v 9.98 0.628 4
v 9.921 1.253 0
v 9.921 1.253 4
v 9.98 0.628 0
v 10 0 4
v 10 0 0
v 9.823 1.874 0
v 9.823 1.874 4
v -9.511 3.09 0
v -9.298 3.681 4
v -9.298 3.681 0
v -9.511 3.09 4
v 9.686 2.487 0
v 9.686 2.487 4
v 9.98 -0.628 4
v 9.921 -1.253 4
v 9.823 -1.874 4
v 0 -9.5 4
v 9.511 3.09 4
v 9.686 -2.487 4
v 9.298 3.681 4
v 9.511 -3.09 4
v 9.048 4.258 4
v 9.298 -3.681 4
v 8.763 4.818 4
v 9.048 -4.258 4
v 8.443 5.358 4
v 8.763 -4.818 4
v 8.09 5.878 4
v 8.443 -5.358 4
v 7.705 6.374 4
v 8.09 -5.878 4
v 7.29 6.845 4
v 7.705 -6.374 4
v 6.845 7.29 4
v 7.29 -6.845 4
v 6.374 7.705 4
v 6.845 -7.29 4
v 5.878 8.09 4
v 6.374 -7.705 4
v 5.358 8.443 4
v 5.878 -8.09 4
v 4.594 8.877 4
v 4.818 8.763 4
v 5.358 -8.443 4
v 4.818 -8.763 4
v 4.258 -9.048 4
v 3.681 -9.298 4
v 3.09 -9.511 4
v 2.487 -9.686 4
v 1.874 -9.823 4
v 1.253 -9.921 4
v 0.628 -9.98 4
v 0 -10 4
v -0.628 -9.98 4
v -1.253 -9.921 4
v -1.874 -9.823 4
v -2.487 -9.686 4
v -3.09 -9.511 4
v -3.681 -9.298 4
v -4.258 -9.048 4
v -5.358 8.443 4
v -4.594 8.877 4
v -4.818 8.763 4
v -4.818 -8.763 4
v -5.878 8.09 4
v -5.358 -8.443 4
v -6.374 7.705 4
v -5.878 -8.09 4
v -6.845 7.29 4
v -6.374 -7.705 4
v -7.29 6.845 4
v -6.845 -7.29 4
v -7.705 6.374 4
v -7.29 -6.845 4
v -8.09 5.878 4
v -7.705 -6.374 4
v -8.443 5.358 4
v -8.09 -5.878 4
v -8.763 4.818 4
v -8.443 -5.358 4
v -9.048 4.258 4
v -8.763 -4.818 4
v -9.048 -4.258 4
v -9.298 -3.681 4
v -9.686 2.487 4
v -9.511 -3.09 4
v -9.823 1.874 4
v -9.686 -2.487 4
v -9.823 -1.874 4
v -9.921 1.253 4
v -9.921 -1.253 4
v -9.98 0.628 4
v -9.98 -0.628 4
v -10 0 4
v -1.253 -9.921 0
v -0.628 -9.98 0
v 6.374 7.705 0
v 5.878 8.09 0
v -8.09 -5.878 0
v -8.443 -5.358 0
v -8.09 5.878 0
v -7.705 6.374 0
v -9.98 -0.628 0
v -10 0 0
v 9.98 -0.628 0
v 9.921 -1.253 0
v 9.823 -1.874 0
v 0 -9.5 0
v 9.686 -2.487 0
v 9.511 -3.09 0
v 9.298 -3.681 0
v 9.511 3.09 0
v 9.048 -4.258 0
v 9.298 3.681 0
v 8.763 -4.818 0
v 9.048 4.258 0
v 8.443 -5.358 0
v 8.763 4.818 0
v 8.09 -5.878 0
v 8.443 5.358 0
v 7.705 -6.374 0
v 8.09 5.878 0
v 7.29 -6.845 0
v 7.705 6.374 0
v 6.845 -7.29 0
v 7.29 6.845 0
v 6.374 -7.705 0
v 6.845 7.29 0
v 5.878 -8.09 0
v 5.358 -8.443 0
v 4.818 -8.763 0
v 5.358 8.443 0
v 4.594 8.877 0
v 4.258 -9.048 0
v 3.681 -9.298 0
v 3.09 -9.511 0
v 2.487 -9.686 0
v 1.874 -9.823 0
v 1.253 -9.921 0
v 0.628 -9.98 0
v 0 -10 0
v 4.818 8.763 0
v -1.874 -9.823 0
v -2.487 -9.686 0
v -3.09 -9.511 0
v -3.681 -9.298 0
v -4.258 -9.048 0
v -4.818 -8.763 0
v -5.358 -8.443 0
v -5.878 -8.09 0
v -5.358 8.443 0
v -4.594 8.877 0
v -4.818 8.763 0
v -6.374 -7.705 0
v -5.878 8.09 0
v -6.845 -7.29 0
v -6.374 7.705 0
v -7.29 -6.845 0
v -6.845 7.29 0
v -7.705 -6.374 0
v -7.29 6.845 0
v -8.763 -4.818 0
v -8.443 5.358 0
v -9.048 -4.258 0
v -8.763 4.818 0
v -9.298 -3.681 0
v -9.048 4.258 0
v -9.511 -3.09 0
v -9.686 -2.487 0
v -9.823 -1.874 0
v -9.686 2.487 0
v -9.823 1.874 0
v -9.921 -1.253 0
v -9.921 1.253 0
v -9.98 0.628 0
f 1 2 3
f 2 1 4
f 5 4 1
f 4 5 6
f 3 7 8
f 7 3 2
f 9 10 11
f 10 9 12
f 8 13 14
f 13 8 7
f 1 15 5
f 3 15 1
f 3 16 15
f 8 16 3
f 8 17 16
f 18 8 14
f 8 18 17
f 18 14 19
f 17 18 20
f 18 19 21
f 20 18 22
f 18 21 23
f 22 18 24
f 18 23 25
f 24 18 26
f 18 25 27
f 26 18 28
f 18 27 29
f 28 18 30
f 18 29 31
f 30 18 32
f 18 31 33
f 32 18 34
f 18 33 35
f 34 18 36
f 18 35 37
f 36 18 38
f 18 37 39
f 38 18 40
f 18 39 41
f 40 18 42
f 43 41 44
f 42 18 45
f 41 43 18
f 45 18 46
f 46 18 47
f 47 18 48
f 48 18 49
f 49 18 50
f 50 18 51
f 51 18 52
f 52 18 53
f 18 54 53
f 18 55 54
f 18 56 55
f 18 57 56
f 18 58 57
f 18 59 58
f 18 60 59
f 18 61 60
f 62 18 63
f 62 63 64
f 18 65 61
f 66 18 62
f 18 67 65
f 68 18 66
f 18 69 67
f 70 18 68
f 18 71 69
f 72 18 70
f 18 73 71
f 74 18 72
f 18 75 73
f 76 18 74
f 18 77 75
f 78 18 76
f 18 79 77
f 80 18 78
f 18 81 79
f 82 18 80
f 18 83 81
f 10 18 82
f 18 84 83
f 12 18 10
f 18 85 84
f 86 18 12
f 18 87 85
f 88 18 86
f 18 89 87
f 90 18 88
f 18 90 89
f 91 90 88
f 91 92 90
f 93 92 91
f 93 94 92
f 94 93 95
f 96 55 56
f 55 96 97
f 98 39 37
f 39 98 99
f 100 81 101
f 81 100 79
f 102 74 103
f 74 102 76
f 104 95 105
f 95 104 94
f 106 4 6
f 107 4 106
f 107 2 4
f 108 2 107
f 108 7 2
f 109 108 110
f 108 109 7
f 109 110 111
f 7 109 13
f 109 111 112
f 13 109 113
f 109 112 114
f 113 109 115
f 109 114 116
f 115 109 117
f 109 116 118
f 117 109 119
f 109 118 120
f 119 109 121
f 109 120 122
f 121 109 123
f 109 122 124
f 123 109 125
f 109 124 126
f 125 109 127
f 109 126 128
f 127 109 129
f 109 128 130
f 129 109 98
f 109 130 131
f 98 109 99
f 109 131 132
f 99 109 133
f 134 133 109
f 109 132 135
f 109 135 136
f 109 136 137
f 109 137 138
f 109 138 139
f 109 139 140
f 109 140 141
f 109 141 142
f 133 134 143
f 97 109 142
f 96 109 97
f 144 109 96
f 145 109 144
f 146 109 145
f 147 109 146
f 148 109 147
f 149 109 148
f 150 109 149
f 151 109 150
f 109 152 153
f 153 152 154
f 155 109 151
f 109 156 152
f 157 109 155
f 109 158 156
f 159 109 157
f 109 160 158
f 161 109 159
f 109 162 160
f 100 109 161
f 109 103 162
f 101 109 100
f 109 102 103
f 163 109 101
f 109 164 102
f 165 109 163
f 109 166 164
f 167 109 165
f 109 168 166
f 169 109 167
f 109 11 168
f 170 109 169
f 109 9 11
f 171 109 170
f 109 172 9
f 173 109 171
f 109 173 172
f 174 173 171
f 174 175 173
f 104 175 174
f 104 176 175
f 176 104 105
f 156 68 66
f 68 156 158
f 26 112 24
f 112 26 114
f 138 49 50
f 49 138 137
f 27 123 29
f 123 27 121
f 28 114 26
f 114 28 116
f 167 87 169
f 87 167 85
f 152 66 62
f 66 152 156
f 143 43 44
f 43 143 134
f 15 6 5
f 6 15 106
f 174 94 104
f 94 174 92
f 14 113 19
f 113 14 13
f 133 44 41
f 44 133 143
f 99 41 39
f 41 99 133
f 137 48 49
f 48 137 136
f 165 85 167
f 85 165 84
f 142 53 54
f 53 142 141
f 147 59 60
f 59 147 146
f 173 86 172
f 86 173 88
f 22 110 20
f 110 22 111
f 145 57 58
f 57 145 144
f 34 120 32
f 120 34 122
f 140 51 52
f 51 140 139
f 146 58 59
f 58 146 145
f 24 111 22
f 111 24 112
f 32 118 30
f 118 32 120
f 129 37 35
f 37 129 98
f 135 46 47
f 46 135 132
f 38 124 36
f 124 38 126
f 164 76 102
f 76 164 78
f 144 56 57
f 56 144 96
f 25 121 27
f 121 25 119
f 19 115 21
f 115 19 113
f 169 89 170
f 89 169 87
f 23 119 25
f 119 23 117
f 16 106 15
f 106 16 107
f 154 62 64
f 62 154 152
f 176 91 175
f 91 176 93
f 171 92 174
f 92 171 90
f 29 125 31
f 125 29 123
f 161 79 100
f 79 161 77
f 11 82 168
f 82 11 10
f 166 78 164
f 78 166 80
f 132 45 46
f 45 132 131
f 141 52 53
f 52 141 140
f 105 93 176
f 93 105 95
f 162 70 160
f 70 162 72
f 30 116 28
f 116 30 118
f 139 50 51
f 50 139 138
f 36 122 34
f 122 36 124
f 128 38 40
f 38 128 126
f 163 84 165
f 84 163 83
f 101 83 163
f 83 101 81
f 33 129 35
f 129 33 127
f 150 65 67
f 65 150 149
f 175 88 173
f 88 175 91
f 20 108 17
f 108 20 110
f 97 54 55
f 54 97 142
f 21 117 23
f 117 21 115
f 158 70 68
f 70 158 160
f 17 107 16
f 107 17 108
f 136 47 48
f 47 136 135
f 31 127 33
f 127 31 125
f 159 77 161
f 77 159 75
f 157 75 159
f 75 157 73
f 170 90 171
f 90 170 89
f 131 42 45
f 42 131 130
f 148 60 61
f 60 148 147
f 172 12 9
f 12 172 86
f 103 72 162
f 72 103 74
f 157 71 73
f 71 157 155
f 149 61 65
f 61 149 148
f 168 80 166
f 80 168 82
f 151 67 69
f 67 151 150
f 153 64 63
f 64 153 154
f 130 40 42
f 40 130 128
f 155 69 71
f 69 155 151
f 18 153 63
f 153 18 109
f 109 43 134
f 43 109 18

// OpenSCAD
        //Width of the channel that connects the two parts.
//For a good combing test, this should be less than 2 line widths.
//That way, the slicer will be able to comb within the preferred boundary
//for the most part, but will have to fall back to the minimum boundary for
//this narrow channel.
channel_width = 0.5;
radius = 10;
$fn=100;

difference() {
	cylinder(r=radius, h=4);
	translate([0, -radius + channel_width, -1]) {
		scale([0.25, 1, 1]) {
			rotate([0, 0, 45]) {
				cube(40);
			}
		}
	}
}
